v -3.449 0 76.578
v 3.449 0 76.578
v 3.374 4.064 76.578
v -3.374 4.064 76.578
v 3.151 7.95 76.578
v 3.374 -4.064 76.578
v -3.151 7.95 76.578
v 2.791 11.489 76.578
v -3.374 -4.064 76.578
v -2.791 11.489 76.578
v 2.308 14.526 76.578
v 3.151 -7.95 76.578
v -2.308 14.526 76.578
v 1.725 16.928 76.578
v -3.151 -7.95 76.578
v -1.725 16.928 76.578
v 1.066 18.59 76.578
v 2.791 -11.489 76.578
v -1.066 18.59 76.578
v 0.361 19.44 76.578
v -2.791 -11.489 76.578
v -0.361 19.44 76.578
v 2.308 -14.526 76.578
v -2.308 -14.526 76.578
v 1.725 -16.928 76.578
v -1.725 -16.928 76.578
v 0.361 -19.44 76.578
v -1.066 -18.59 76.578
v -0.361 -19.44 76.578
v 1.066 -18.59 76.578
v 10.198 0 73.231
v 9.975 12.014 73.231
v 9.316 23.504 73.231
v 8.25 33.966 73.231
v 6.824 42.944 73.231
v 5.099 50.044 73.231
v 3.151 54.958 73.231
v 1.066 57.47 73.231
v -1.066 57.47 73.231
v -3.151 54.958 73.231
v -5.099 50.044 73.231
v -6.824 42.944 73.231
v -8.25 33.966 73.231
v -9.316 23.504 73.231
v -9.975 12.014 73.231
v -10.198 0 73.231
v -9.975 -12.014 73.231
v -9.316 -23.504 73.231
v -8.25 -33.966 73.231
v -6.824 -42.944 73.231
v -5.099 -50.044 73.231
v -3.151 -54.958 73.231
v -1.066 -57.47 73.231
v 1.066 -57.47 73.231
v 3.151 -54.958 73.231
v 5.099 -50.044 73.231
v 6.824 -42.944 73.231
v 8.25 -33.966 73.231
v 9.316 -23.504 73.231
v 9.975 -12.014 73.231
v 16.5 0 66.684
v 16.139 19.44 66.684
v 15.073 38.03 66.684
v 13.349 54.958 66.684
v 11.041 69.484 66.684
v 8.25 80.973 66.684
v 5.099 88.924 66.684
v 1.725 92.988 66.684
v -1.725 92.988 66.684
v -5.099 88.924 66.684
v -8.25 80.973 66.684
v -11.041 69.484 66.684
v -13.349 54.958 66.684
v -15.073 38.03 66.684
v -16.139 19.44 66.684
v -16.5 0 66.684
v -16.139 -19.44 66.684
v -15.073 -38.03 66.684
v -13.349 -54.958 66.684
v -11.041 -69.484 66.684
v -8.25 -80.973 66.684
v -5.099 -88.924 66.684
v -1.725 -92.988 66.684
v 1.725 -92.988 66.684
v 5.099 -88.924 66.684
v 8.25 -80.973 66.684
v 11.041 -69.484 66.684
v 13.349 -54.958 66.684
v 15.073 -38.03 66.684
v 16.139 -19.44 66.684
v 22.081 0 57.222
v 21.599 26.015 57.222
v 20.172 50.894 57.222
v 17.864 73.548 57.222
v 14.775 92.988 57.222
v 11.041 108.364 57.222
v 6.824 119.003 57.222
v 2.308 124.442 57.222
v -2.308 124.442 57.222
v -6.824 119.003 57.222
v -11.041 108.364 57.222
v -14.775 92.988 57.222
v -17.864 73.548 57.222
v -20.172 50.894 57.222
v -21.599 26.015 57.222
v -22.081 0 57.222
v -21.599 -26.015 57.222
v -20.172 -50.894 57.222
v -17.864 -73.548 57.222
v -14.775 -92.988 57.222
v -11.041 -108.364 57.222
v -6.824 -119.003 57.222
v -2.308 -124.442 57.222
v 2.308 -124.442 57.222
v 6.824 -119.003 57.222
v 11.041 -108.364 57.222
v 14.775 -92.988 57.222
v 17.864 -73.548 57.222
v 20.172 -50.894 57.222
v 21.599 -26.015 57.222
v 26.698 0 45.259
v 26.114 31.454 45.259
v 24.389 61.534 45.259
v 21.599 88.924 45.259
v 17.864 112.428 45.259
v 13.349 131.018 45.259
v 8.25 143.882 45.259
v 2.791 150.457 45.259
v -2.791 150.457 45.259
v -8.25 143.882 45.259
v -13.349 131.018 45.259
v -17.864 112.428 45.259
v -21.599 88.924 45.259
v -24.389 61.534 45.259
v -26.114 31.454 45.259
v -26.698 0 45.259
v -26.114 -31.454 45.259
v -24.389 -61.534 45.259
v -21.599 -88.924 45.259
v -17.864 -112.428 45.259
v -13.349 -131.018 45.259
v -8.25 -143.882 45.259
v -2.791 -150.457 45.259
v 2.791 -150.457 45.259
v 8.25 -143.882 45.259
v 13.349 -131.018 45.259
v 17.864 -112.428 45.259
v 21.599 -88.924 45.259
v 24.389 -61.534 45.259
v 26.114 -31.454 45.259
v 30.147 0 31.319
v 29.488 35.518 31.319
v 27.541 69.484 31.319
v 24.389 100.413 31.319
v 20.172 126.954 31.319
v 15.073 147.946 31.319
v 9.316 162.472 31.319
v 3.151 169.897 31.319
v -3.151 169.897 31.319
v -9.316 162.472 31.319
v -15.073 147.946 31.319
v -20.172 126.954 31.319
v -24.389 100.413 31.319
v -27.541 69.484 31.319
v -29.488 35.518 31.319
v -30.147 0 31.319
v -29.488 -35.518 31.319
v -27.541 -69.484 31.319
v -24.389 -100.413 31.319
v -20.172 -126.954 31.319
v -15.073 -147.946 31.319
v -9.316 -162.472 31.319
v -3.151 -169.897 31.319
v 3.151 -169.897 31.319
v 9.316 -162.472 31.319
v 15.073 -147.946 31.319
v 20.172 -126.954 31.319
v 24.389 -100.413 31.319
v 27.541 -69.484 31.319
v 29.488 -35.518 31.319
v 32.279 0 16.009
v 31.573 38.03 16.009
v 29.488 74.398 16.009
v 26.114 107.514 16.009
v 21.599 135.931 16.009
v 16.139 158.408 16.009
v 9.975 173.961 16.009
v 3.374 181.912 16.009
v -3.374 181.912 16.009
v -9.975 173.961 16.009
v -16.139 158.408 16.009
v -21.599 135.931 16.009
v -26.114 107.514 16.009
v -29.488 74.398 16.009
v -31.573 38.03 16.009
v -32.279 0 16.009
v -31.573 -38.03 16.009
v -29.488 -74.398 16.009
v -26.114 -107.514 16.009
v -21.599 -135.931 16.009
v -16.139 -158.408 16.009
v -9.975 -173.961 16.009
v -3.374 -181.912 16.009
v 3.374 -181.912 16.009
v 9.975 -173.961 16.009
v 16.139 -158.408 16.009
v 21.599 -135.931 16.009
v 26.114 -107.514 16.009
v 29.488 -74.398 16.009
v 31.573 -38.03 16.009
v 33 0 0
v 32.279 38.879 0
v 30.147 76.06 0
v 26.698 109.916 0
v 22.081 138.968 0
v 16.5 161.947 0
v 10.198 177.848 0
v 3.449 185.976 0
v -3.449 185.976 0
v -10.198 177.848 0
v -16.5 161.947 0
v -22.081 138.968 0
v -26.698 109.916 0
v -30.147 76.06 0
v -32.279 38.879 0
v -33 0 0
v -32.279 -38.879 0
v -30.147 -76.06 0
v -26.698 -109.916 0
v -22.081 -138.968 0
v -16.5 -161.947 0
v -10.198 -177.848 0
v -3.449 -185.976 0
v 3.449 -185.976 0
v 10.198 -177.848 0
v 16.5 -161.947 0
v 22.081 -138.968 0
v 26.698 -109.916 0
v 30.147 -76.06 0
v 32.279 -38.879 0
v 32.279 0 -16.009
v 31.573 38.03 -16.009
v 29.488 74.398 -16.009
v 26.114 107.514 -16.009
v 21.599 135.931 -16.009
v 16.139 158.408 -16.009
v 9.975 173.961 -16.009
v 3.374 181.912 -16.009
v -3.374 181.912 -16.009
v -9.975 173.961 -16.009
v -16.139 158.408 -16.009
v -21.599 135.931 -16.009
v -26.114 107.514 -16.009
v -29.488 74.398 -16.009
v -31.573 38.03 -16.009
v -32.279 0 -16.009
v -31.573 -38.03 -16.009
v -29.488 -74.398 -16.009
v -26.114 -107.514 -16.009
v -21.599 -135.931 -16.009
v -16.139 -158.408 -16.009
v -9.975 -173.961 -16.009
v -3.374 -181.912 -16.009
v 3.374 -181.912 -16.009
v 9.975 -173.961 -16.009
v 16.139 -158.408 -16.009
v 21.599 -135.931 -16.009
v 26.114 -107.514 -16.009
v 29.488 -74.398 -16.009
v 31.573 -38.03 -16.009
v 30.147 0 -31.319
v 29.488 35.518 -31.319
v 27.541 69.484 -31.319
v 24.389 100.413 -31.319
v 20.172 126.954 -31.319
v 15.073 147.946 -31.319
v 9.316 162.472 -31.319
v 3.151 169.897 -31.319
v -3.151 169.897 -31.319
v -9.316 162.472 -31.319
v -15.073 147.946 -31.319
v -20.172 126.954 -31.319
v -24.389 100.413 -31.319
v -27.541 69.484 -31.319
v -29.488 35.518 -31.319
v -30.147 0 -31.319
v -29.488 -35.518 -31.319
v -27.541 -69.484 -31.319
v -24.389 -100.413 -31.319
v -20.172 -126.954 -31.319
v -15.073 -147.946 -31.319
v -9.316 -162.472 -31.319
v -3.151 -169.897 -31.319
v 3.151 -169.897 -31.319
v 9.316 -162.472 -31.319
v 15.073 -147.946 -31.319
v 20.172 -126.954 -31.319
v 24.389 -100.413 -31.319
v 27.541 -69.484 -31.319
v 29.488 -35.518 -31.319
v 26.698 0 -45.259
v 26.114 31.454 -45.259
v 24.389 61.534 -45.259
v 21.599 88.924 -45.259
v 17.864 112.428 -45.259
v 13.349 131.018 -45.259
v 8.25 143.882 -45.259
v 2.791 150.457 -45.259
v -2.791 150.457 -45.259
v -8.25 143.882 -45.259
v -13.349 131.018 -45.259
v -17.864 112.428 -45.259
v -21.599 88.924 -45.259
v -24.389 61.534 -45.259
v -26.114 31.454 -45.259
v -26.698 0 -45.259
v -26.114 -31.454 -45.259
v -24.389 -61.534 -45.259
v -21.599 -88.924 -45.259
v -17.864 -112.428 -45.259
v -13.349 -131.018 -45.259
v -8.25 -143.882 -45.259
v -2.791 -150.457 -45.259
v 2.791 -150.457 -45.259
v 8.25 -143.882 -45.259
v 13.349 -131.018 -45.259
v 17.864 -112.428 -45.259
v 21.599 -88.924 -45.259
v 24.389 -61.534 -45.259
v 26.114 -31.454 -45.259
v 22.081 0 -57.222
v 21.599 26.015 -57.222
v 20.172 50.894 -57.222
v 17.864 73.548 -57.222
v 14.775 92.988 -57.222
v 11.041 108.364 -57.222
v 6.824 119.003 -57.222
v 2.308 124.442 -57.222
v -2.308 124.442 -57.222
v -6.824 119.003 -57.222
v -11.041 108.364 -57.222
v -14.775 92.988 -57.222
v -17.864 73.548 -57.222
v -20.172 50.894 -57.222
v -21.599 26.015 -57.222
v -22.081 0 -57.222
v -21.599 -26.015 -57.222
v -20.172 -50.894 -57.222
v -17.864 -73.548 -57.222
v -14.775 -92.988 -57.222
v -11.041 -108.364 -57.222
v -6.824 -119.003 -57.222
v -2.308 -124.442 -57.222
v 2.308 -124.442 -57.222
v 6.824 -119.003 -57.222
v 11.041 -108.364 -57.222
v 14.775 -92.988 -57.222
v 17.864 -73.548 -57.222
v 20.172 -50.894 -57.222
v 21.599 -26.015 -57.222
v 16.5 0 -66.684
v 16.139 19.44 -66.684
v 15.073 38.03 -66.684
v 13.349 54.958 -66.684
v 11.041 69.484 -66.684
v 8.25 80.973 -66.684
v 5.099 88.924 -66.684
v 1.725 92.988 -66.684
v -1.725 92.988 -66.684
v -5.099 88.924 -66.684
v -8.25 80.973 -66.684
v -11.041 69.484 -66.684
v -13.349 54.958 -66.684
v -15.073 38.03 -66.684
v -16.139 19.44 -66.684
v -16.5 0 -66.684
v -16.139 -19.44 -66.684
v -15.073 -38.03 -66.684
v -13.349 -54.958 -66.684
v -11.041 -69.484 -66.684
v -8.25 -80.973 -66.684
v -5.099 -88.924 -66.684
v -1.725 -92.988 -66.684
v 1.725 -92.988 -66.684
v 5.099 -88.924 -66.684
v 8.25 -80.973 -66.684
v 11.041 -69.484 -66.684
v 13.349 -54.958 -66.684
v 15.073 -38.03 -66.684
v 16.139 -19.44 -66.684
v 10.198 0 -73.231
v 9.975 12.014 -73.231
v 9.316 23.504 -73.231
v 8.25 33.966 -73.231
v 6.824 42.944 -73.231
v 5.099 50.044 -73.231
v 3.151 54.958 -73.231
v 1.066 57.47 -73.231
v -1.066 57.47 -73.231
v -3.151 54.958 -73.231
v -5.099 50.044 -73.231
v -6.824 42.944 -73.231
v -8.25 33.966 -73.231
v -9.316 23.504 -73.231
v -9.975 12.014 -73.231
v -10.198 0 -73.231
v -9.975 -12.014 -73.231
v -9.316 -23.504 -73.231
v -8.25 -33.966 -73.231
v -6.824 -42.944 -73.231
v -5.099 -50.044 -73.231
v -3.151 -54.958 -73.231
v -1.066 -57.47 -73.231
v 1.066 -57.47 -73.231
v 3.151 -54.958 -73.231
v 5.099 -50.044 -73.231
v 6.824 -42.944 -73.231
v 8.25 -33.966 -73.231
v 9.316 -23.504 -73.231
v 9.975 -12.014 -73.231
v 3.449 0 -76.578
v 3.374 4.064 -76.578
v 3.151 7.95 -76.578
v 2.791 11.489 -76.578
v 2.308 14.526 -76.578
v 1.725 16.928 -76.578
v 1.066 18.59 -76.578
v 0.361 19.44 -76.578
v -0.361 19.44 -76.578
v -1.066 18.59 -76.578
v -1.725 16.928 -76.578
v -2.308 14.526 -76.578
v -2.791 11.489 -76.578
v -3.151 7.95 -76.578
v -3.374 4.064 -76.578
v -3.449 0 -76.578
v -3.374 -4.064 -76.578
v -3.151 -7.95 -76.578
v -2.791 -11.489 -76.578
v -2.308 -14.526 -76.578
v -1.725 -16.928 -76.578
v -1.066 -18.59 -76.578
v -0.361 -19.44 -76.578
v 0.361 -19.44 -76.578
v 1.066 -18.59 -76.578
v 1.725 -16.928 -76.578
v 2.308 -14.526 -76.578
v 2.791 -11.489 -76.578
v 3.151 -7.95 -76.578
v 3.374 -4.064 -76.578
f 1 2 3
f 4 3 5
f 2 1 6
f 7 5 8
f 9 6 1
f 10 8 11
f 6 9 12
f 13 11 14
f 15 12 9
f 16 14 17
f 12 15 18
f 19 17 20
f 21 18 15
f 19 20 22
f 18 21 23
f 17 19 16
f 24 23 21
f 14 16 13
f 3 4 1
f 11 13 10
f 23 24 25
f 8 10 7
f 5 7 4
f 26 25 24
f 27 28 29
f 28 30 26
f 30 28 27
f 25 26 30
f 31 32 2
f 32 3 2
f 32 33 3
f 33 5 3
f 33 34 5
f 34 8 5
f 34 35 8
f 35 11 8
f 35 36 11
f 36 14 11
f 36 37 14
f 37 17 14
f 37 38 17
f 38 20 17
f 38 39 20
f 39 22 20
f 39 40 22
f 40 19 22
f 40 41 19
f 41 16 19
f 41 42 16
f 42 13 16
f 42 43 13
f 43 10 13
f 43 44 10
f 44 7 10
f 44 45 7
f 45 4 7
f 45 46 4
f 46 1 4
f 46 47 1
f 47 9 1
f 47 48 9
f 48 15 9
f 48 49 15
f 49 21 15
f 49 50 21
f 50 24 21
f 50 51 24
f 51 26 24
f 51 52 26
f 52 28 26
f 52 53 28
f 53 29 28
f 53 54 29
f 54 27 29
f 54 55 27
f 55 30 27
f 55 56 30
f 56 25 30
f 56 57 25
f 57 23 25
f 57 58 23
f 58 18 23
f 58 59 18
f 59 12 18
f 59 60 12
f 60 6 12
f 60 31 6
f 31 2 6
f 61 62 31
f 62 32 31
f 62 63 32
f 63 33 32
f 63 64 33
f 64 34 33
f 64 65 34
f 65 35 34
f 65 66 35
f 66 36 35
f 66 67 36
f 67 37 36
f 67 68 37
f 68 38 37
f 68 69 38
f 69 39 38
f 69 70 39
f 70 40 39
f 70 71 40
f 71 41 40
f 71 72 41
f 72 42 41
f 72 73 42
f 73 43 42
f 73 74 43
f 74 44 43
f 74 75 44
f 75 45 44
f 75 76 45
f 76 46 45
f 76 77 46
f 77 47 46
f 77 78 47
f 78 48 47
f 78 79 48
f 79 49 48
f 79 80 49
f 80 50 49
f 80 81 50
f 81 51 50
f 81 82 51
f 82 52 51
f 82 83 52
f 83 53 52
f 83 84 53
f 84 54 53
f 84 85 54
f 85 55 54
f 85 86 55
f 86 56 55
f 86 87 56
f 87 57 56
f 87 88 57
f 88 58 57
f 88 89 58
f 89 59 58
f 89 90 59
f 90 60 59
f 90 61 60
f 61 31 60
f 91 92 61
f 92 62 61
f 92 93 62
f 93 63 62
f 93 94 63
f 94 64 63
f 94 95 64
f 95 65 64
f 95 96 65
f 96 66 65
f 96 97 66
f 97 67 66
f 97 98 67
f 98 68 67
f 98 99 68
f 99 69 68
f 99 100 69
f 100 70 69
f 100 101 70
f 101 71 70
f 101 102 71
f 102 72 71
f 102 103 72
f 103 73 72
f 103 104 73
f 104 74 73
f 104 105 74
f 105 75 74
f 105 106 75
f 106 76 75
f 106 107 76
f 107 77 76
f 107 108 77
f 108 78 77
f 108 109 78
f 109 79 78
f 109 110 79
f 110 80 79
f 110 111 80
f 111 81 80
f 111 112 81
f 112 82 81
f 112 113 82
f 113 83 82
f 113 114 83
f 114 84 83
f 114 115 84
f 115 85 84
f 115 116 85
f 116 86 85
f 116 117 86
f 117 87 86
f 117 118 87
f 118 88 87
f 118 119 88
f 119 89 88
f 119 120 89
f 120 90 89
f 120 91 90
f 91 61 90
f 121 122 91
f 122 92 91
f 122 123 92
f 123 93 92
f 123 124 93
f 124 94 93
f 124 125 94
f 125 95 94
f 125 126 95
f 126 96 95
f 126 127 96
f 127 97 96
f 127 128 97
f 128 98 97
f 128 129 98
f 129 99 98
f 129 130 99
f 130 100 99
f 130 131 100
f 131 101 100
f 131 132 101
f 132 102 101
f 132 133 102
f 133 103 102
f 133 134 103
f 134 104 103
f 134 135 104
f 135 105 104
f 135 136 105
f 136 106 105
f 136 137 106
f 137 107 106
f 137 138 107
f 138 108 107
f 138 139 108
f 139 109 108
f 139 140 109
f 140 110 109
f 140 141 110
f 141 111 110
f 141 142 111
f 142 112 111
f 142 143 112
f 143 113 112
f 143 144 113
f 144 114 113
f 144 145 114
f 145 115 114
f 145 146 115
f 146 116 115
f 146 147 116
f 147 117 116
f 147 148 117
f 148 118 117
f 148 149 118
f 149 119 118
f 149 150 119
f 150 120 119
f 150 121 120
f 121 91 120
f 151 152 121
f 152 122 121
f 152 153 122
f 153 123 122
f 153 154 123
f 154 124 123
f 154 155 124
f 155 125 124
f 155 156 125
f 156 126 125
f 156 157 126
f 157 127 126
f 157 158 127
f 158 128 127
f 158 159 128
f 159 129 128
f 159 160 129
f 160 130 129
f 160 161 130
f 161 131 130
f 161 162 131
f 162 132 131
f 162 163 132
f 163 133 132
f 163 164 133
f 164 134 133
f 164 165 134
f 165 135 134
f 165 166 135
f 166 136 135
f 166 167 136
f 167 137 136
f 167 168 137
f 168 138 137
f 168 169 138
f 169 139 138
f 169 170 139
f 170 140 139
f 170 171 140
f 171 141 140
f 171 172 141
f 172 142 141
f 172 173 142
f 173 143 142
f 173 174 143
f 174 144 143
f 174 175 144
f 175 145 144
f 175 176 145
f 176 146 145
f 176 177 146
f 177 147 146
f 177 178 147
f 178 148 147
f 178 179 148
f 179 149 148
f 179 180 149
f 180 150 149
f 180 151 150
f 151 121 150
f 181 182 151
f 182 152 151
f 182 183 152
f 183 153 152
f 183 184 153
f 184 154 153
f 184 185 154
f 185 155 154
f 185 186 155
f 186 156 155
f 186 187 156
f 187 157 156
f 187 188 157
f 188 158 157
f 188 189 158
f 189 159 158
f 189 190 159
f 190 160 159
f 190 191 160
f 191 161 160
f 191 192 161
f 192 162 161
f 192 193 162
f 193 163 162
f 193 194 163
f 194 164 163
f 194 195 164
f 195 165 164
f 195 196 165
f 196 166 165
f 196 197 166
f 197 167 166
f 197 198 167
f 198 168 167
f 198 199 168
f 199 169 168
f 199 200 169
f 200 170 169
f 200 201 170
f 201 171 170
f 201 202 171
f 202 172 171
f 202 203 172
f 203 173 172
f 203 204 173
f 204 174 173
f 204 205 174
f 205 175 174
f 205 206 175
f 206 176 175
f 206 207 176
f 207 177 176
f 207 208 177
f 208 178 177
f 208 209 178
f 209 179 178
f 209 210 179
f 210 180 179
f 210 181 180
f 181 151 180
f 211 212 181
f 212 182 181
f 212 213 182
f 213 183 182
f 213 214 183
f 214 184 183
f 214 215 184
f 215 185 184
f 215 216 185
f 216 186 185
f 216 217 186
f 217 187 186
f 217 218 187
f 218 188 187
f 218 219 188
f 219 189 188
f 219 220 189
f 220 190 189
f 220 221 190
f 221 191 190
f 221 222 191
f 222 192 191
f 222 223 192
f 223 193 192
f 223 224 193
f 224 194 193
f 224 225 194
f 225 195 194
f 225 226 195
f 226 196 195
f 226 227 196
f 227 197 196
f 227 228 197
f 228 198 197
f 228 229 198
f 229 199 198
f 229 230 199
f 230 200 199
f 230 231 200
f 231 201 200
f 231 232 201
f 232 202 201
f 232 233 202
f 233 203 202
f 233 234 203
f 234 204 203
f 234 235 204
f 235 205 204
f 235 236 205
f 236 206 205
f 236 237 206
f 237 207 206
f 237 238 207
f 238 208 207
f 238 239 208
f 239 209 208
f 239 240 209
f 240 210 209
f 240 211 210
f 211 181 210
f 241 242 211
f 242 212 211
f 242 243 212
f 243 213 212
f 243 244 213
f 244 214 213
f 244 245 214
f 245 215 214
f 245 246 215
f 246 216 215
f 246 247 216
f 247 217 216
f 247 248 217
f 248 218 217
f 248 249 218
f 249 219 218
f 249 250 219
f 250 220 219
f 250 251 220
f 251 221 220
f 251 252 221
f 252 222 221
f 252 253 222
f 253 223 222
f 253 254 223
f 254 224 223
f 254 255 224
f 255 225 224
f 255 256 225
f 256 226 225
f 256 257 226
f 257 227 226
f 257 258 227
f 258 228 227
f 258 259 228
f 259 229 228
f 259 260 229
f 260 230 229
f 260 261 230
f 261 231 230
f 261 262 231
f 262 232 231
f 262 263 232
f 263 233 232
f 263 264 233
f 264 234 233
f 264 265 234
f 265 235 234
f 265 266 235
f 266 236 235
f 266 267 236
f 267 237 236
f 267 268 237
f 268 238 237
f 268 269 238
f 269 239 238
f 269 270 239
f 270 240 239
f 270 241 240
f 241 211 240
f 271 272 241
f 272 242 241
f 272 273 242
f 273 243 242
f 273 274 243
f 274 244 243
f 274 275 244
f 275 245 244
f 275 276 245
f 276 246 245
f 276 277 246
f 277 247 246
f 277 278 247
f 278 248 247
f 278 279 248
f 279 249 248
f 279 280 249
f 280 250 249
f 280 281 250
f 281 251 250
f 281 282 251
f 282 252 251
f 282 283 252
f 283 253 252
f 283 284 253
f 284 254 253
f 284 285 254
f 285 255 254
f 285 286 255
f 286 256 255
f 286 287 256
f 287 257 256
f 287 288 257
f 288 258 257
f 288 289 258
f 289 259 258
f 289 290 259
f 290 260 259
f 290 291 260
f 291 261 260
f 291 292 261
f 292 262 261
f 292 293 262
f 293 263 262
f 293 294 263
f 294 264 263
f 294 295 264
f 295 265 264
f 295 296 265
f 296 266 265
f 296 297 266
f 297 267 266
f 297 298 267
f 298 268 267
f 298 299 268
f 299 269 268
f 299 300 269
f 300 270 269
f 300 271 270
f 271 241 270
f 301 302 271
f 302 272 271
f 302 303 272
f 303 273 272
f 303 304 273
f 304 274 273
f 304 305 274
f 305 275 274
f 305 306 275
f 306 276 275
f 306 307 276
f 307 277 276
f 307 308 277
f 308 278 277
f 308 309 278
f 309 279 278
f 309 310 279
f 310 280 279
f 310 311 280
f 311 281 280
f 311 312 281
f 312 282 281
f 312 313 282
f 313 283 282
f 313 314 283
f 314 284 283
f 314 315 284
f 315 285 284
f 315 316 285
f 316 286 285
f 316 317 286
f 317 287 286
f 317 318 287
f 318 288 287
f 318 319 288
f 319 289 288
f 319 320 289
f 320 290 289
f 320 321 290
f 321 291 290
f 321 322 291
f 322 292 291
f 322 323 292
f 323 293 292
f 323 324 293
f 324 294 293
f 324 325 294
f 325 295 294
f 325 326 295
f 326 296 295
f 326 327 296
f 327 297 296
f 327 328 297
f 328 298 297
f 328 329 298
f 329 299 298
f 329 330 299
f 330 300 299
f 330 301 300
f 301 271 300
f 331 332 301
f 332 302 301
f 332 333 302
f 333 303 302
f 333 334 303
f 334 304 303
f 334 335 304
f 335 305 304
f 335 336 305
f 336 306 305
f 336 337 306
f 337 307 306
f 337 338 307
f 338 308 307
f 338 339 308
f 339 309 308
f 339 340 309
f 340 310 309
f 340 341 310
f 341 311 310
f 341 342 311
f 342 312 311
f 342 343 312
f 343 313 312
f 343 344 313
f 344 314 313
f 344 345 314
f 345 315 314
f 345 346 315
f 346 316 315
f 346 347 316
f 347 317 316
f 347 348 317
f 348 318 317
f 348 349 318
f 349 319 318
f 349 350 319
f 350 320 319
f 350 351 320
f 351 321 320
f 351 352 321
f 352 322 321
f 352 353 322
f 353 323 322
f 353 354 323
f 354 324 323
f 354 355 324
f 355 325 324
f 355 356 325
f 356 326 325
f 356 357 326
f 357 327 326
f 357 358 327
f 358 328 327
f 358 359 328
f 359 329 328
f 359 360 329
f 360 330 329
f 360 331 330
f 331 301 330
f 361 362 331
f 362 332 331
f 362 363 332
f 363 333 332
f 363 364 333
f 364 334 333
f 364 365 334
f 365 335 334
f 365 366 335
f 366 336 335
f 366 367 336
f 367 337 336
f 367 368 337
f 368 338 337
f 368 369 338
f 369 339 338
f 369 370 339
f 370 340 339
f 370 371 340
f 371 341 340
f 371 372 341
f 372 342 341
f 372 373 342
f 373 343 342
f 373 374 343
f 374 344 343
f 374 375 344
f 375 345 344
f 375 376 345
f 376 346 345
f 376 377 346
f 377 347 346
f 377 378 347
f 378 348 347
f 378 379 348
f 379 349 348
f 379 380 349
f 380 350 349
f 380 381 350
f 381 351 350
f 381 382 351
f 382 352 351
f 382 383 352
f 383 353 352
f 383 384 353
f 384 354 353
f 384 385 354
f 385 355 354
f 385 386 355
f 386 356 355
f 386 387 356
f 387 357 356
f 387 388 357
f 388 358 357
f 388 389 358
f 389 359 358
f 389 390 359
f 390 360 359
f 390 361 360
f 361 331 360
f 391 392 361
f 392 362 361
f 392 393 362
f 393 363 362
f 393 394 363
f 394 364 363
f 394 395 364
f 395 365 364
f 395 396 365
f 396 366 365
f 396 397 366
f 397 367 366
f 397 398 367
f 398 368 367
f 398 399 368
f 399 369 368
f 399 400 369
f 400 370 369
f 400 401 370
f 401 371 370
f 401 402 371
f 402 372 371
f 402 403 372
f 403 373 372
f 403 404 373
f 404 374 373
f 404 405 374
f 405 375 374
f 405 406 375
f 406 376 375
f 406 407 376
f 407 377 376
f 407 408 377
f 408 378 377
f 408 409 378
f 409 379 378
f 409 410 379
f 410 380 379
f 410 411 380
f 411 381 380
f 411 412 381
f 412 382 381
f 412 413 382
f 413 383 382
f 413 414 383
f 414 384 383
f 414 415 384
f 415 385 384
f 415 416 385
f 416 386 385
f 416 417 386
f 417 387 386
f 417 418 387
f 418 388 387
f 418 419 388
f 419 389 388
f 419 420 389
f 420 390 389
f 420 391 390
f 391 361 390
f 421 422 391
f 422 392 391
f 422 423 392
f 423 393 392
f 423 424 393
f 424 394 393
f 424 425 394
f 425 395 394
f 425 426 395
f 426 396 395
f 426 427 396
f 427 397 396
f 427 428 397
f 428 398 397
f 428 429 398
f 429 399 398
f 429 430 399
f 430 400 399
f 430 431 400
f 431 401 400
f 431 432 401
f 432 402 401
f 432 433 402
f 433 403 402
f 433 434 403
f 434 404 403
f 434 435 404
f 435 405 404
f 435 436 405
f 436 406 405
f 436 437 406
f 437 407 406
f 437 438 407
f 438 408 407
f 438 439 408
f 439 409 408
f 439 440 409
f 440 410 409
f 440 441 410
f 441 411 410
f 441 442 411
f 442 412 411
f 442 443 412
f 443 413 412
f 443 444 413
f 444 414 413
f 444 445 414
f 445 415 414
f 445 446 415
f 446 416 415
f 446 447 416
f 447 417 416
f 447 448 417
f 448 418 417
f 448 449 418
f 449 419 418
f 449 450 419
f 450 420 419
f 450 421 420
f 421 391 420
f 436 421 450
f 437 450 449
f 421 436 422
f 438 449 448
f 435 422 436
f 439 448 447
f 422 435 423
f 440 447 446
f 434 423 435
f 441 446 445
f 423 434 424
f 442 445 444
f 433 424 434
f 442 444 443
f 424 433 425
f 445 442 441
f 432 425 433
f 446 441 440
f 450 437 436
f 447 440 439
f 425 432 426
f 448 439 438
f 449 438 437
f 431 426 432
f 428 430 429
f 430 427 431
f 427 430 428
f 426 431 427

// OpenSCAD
// Generated by SolidPython 1.0.1 on 2020-07-29 00:46:45


scale(v = [3, 17, 7]) {
	sphere(r = 11);
}
/***********************************************
*********      SolidPython code:      **********
************************************************
 
# import packages: SolidPython
from solid import *
from solid.utils import *
from itertools import chain, combinations, permutations


class Resize:

    def __init__(self, scad_file):
        self.scad_file = scad_file
        #self.scad_file = import_scad(scad_file)
        # cone/cylinder param:
        self.r1 = 0
        self.r2 = 0
        self.h = 0
        # rectangular prism param:
        self.w = 0
        self.l = 0
        # ellipse param:
        self.r = 0

    # import OpenScad code (file name corresponds to shape)


    # classify shape + parameters
    def assign(self, param1, param2, param3):
        if self.scad_file == 'cone.scad':
            self.r1 = param1
            self.r2 = param2
            self.h = param3
        elif self.scad_file == 'cylinder.scad':
            self.r1 = param1
            self.r2 = param2
            self.h = param3
        elif self.scad_file == 'rectangularPrism.scad':
            self.h = param1
            self.l = param2
            self.w = param3
        else:
            self.r = param1
            self.h = param2

    # resize parameters
    def iterate(self):
        x = range(3, 20, 2)
        i = 1
        if self.scad_file == 'cone.scad':
            tempList = list(permutations(x, 2))
            for temp in tempList:
                param1 = temp[0]
                param2 = temp[1]
                filepath = 'produced_scad_files/' + 'cone' + str(param1) + '_' + str(param2) + '_' + '.scad'
                scad_render_to_file(cylinder(h=param1, r1=param2, r2=0), filepath)

        elif self.scad_file == 'cylinder.scad':
            tempList = list(permutations(x, 3))
            for temp in tempList:
                param1 = temp[0]
                param2 = temp[1]
                filepath = 'produced_scad_files/' + 'cylinder' + str(param1) + '_' + str(param2) + '_' + '.scad'
                scad_render_to_file(cylinder(h=param1, r1=param2, r2=param2), filepath)

        elif self.scad_file == 'rectangularPrism.scad':
            tempList = list(permutations(x, 3))
            for temp in tempList:
                param1 = temp[0]
                param2 = temp[1]
                param3 = temp[2]
                filepath = 'produced_scad_files/' + 'rectangularPrism' + str(param1) + '_' + str(param2) + '_' + str(
                    param3) + '.scad'
                scad_render_to_file(cube(size=(param1, param2, param3)), filepath)

        elif self.scad_file == 'ellipse.scad':
            tempList = list(permutations(x, 4))
            for temp in tempList:
                param1 = temp[0]
                param2 = temp[1]
                param3 = temp[2]
                param4 = temp[3]
                filepath = 'produced_scad_files/' + 'ellipse' + str(param1) + '_' + str(param2) + '_' + str(param3) + '_' + str(param4) + '.scad'
                scad_render_to_file(scale([param1, param2, param3])(sphere(r=param4)), filepath)

    def render_to_scadfile(self):
        scad_render_to_file(scad, 'example.scad') 
 
************************************************/
